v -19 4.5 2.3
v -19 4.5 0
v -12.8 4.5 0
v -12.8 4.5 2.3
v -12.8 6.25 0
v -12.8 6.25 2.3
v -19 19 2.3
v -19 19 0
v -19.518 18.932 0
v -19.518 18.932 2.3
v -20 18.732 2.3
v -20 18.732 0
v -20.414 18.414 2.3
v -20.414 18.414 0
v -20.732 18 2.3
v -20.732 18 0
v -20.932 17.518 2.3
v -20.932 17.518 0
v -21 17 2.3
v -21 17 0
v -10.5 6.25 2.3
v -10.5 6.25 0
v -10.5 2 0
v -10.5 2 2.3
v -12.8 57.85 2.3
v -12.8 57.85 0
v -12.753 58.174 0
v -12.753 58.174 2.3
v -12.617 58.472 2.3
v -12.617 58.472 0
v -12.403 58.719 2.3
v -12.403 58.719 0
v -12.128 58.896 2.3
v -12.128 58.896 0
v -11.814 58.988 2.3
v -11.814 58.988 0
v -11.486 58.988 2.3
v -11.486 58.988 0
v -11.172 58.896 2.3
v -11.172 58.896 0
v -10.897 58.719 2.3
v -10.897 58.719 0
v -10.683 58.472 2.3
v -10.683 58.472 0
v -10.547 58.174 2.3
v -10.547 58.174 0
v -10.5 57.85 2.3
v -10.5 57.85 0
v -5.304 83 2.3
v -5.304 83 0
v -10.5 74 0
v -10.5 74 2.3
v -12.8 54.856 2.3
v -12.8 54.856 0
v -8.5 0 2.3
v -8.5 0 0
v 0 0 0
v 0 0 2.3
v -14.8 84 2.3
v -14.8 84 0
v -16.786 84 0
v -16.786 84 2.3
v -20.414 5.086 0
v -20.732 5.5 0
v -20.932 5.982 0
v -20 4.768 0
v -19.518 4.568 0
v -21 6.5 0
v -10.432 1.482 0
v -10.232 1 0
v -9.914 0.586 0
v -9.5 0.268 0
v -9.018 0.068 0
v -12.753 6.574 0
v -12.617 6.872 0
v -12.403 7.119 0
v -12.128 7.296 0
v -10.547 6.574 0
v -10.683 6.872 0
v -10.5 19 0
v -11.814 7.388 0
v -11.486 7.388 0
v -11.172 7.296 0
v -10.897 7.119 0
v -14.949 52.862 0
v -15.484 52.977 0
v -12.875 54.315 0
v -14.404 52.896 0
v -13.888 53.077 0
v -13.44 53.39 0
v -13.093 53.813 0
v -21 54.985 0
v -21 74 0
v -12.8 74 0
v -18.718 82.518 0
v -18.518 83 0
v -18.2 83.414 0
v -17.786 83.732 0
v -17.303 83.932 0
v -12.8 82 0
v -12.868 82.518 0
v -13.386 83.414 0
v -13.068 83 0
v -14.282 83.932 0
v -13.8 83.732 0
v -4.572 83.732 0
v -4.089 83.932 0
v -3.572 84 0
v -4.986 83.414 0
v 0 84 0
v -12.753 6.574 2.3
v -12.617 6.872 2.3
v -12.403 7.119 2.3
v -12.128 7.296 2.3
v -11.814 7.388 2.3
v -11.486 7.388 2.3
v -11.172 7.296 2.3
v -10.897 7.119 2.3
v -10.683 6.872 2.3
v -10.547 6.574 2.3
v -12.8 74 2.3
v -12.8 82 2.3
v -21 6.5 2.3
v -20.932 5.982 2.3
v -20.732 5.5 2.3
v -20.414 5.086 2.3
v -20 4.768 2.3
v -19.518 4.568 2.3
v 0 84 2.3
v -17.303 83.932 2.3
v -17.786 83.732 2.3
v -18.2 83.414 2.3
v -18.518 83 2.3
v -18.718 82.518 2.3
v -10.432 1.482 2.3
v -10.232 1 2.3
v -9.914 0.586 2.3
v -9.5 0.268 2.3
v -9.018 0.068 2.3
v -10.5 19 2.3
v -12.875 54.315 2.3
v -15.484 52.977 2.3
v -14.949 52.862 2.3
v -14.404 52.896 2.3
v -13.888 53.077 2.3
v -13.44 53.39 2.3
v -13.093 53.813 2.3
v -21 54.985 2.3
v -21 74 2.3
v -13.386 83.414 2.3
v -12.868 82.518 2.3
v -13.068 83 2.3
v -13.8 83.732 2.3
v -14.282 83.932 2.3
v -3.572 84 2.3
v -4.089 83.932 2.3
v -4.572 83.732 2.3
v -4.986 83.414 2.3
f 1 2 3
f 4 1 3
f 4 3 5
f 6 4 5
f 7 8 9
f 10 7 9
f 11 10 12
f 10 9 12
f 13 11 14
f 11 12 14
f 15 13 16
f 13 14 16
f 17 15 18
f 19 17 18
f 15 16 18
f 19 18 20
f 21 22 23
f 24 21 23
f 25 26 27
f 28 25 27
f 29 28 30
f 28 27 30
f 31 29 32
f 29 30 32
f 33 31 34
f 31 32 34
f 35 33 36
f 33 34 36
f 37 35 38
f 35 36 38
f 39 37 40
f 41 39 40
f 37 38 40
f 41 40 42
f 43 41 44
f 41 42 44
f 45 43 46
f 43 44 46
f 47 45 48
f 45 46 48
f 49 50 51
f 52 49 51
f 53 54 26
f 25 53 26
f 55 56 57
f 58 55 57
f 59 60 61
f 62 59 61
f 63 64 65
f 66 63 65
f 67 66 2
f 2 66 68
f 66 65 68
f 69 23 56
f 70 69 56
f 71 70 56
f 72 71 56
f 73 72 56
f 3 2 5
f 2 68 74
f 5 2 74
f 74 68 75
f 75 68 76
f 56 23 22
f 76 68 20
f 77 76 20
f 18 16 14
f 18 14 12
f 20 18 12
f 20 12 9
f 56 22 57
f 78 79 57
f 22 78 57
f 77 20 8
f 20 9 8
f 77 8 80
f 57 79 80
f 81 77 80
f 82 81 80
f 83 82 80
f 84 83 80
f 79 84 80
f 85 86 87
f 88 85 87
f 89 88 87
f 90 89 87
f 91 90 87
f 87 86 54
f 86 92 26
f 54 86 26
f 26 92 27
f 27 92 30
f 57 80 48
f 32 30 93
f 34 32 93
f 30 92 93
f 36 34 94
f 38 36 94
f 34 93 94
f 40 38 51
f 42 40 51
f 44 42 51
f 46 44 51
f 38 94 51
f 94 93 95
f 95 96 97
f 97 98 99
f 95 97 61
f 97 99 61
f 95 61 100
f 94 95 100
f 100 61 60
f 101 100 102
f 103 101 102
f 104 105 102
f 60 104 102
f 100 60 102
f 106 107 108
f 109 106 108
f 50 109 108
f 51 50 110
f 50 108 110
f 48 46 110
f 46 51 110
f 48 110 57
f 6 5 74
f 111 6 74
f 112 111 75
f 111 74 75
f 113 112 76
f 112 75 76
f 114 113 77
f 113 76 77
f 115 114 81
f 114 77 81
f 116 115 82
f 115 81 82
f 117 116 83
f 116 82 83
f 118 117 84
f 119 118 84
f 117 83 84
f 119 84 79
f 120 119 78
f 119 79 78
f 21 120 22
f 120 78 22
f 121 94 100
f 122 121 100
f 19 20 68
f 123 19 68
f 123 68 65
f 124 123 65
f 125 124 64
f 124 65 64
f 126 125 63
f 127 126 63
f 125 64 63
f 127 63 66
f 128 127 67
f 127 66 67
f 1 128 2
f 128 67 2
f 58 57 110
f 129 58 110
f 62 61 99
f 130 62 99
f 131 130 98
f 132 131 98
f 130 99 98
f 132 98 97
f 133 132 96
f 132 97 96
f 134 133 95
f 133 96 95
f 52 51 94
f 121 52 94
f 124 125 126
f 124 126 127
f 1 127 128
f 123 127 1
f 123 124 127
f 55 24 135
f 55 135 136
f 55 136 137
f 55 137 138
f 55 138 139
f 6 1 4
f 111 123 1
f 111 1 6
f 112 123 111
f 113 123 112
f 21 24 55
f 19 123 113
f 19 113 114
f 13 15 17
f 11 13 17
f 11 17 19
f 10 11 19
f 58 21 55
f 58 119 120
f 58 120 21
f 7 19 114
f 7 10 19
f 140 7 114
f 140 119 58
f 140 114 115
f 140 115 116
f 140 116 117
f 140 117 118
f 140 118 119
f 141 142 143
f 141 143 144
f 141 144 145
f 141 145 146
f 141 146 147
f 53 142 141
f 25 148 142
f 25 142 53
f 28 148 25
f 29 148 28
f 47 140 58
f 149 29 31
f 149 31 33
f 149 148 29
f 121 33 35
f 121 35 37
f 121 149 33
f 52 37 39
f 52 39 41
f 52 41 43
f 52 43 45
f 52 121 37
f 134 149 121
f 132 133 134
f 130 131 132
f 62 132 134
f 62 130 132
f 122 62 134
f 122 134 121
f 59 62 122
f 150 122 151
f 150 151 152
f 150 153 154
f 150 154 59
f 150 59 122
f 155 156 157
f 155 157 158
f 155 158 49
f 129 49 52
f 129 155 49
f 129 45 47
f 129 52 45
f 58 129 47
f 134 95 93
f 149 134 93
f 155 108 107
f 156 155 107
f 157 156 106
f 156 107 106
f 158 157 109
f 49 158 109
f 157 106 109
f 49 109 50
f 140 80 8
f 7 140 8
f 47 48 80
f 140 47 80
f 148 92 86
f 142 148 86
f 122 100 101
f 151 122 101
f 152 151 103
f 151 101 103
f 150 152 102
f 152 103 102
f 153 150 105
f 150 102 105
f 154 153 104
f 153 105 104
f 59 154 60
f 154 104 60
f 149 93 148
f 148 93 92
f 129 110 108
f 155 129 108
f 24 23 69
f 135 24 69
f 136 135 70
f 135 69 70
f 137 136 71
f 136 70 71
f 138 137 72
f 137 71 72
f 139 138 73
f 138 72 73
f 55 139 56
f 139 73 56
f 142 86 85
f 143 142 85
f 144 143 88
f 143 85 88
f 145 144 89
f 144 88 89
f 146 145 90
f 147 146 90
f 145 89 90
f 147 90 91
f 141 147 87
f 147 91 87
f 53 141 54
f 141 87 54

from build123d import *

# Parameters (mm, degrees)
F1_DEPTH = 2.3


with BuildPart() as f1:
    # F0 (on Top) → F1 (new body)
    with BuildSketch(Plane.XY):
        with BuildLine():
            Line((-8.5, 0), (0, 0))
            Line((0, 0), (0, 84))
            Line((0, 84), (-3.571797, 84))
            ThreePointArc((-3.571797, 84), (-4.571797, 83.732051), (-5.303848, 83))
            Line((-5.303848, 83), (-10.5, 74))
            Line((-10.5, 74), (-12.8, 74))
            Line((-12.8, 74), (-12.8, 82))
            ThreePointArc((-12.8, 82), (-13.385786, 83.414214), (-14.8, 84))
            Line((-14.8, 84), (-16.785854, 84))
            ThreePointArc((-16.785854, 84), (-18.003377, 83.586707), (-18.717706, 82.517638))
            Line((-18.717706, 82.517638), (-21, 74))
            Line((-21, 74), (-21, 54.984556))
            Line((-21, 54.984556), (-15.48404, 52.976911))
            ThreePointArc((-15.48404, 52.976911), (-13.652847, 53.217992), (-12.8, 54.856296))
            Line((-12.8, 54.856296), (-12.8, 57.85))
            ThreePointArc((-12.8, 57.85), (-11.65, 59), (-10.5, 57.85))
            Line((-10.5, 57.85), (-10.5, 19))
            Line((-10.5, 19), (-19, 19))
            ThreePointArc((-19, 19), (-20.414214, 18.414214), (-21, 17))
            Line((-21, 17), (-21, 6.5))
            ThreePointArc((-21, 6.5), (-20.414214, 5.085786), (-19, 4.5))
            Line((-19, 4.5), (-12.8, 4.5))
            Line((-12.8, 4.5), (-12.8, 6.25))
            ThreePointArc((-12.8, 6.25), (-11.65, 7.4), (-10.5, 6.25))
            Line((-10.5, 6.25), (-10.5, 2))
            ThreePointArc((-10.5, 2), (-9.914214, 0.585786), (-8.5, 0))
        make_face()
    extrude(amount=F1_DEPTH)


solid = f1.part
